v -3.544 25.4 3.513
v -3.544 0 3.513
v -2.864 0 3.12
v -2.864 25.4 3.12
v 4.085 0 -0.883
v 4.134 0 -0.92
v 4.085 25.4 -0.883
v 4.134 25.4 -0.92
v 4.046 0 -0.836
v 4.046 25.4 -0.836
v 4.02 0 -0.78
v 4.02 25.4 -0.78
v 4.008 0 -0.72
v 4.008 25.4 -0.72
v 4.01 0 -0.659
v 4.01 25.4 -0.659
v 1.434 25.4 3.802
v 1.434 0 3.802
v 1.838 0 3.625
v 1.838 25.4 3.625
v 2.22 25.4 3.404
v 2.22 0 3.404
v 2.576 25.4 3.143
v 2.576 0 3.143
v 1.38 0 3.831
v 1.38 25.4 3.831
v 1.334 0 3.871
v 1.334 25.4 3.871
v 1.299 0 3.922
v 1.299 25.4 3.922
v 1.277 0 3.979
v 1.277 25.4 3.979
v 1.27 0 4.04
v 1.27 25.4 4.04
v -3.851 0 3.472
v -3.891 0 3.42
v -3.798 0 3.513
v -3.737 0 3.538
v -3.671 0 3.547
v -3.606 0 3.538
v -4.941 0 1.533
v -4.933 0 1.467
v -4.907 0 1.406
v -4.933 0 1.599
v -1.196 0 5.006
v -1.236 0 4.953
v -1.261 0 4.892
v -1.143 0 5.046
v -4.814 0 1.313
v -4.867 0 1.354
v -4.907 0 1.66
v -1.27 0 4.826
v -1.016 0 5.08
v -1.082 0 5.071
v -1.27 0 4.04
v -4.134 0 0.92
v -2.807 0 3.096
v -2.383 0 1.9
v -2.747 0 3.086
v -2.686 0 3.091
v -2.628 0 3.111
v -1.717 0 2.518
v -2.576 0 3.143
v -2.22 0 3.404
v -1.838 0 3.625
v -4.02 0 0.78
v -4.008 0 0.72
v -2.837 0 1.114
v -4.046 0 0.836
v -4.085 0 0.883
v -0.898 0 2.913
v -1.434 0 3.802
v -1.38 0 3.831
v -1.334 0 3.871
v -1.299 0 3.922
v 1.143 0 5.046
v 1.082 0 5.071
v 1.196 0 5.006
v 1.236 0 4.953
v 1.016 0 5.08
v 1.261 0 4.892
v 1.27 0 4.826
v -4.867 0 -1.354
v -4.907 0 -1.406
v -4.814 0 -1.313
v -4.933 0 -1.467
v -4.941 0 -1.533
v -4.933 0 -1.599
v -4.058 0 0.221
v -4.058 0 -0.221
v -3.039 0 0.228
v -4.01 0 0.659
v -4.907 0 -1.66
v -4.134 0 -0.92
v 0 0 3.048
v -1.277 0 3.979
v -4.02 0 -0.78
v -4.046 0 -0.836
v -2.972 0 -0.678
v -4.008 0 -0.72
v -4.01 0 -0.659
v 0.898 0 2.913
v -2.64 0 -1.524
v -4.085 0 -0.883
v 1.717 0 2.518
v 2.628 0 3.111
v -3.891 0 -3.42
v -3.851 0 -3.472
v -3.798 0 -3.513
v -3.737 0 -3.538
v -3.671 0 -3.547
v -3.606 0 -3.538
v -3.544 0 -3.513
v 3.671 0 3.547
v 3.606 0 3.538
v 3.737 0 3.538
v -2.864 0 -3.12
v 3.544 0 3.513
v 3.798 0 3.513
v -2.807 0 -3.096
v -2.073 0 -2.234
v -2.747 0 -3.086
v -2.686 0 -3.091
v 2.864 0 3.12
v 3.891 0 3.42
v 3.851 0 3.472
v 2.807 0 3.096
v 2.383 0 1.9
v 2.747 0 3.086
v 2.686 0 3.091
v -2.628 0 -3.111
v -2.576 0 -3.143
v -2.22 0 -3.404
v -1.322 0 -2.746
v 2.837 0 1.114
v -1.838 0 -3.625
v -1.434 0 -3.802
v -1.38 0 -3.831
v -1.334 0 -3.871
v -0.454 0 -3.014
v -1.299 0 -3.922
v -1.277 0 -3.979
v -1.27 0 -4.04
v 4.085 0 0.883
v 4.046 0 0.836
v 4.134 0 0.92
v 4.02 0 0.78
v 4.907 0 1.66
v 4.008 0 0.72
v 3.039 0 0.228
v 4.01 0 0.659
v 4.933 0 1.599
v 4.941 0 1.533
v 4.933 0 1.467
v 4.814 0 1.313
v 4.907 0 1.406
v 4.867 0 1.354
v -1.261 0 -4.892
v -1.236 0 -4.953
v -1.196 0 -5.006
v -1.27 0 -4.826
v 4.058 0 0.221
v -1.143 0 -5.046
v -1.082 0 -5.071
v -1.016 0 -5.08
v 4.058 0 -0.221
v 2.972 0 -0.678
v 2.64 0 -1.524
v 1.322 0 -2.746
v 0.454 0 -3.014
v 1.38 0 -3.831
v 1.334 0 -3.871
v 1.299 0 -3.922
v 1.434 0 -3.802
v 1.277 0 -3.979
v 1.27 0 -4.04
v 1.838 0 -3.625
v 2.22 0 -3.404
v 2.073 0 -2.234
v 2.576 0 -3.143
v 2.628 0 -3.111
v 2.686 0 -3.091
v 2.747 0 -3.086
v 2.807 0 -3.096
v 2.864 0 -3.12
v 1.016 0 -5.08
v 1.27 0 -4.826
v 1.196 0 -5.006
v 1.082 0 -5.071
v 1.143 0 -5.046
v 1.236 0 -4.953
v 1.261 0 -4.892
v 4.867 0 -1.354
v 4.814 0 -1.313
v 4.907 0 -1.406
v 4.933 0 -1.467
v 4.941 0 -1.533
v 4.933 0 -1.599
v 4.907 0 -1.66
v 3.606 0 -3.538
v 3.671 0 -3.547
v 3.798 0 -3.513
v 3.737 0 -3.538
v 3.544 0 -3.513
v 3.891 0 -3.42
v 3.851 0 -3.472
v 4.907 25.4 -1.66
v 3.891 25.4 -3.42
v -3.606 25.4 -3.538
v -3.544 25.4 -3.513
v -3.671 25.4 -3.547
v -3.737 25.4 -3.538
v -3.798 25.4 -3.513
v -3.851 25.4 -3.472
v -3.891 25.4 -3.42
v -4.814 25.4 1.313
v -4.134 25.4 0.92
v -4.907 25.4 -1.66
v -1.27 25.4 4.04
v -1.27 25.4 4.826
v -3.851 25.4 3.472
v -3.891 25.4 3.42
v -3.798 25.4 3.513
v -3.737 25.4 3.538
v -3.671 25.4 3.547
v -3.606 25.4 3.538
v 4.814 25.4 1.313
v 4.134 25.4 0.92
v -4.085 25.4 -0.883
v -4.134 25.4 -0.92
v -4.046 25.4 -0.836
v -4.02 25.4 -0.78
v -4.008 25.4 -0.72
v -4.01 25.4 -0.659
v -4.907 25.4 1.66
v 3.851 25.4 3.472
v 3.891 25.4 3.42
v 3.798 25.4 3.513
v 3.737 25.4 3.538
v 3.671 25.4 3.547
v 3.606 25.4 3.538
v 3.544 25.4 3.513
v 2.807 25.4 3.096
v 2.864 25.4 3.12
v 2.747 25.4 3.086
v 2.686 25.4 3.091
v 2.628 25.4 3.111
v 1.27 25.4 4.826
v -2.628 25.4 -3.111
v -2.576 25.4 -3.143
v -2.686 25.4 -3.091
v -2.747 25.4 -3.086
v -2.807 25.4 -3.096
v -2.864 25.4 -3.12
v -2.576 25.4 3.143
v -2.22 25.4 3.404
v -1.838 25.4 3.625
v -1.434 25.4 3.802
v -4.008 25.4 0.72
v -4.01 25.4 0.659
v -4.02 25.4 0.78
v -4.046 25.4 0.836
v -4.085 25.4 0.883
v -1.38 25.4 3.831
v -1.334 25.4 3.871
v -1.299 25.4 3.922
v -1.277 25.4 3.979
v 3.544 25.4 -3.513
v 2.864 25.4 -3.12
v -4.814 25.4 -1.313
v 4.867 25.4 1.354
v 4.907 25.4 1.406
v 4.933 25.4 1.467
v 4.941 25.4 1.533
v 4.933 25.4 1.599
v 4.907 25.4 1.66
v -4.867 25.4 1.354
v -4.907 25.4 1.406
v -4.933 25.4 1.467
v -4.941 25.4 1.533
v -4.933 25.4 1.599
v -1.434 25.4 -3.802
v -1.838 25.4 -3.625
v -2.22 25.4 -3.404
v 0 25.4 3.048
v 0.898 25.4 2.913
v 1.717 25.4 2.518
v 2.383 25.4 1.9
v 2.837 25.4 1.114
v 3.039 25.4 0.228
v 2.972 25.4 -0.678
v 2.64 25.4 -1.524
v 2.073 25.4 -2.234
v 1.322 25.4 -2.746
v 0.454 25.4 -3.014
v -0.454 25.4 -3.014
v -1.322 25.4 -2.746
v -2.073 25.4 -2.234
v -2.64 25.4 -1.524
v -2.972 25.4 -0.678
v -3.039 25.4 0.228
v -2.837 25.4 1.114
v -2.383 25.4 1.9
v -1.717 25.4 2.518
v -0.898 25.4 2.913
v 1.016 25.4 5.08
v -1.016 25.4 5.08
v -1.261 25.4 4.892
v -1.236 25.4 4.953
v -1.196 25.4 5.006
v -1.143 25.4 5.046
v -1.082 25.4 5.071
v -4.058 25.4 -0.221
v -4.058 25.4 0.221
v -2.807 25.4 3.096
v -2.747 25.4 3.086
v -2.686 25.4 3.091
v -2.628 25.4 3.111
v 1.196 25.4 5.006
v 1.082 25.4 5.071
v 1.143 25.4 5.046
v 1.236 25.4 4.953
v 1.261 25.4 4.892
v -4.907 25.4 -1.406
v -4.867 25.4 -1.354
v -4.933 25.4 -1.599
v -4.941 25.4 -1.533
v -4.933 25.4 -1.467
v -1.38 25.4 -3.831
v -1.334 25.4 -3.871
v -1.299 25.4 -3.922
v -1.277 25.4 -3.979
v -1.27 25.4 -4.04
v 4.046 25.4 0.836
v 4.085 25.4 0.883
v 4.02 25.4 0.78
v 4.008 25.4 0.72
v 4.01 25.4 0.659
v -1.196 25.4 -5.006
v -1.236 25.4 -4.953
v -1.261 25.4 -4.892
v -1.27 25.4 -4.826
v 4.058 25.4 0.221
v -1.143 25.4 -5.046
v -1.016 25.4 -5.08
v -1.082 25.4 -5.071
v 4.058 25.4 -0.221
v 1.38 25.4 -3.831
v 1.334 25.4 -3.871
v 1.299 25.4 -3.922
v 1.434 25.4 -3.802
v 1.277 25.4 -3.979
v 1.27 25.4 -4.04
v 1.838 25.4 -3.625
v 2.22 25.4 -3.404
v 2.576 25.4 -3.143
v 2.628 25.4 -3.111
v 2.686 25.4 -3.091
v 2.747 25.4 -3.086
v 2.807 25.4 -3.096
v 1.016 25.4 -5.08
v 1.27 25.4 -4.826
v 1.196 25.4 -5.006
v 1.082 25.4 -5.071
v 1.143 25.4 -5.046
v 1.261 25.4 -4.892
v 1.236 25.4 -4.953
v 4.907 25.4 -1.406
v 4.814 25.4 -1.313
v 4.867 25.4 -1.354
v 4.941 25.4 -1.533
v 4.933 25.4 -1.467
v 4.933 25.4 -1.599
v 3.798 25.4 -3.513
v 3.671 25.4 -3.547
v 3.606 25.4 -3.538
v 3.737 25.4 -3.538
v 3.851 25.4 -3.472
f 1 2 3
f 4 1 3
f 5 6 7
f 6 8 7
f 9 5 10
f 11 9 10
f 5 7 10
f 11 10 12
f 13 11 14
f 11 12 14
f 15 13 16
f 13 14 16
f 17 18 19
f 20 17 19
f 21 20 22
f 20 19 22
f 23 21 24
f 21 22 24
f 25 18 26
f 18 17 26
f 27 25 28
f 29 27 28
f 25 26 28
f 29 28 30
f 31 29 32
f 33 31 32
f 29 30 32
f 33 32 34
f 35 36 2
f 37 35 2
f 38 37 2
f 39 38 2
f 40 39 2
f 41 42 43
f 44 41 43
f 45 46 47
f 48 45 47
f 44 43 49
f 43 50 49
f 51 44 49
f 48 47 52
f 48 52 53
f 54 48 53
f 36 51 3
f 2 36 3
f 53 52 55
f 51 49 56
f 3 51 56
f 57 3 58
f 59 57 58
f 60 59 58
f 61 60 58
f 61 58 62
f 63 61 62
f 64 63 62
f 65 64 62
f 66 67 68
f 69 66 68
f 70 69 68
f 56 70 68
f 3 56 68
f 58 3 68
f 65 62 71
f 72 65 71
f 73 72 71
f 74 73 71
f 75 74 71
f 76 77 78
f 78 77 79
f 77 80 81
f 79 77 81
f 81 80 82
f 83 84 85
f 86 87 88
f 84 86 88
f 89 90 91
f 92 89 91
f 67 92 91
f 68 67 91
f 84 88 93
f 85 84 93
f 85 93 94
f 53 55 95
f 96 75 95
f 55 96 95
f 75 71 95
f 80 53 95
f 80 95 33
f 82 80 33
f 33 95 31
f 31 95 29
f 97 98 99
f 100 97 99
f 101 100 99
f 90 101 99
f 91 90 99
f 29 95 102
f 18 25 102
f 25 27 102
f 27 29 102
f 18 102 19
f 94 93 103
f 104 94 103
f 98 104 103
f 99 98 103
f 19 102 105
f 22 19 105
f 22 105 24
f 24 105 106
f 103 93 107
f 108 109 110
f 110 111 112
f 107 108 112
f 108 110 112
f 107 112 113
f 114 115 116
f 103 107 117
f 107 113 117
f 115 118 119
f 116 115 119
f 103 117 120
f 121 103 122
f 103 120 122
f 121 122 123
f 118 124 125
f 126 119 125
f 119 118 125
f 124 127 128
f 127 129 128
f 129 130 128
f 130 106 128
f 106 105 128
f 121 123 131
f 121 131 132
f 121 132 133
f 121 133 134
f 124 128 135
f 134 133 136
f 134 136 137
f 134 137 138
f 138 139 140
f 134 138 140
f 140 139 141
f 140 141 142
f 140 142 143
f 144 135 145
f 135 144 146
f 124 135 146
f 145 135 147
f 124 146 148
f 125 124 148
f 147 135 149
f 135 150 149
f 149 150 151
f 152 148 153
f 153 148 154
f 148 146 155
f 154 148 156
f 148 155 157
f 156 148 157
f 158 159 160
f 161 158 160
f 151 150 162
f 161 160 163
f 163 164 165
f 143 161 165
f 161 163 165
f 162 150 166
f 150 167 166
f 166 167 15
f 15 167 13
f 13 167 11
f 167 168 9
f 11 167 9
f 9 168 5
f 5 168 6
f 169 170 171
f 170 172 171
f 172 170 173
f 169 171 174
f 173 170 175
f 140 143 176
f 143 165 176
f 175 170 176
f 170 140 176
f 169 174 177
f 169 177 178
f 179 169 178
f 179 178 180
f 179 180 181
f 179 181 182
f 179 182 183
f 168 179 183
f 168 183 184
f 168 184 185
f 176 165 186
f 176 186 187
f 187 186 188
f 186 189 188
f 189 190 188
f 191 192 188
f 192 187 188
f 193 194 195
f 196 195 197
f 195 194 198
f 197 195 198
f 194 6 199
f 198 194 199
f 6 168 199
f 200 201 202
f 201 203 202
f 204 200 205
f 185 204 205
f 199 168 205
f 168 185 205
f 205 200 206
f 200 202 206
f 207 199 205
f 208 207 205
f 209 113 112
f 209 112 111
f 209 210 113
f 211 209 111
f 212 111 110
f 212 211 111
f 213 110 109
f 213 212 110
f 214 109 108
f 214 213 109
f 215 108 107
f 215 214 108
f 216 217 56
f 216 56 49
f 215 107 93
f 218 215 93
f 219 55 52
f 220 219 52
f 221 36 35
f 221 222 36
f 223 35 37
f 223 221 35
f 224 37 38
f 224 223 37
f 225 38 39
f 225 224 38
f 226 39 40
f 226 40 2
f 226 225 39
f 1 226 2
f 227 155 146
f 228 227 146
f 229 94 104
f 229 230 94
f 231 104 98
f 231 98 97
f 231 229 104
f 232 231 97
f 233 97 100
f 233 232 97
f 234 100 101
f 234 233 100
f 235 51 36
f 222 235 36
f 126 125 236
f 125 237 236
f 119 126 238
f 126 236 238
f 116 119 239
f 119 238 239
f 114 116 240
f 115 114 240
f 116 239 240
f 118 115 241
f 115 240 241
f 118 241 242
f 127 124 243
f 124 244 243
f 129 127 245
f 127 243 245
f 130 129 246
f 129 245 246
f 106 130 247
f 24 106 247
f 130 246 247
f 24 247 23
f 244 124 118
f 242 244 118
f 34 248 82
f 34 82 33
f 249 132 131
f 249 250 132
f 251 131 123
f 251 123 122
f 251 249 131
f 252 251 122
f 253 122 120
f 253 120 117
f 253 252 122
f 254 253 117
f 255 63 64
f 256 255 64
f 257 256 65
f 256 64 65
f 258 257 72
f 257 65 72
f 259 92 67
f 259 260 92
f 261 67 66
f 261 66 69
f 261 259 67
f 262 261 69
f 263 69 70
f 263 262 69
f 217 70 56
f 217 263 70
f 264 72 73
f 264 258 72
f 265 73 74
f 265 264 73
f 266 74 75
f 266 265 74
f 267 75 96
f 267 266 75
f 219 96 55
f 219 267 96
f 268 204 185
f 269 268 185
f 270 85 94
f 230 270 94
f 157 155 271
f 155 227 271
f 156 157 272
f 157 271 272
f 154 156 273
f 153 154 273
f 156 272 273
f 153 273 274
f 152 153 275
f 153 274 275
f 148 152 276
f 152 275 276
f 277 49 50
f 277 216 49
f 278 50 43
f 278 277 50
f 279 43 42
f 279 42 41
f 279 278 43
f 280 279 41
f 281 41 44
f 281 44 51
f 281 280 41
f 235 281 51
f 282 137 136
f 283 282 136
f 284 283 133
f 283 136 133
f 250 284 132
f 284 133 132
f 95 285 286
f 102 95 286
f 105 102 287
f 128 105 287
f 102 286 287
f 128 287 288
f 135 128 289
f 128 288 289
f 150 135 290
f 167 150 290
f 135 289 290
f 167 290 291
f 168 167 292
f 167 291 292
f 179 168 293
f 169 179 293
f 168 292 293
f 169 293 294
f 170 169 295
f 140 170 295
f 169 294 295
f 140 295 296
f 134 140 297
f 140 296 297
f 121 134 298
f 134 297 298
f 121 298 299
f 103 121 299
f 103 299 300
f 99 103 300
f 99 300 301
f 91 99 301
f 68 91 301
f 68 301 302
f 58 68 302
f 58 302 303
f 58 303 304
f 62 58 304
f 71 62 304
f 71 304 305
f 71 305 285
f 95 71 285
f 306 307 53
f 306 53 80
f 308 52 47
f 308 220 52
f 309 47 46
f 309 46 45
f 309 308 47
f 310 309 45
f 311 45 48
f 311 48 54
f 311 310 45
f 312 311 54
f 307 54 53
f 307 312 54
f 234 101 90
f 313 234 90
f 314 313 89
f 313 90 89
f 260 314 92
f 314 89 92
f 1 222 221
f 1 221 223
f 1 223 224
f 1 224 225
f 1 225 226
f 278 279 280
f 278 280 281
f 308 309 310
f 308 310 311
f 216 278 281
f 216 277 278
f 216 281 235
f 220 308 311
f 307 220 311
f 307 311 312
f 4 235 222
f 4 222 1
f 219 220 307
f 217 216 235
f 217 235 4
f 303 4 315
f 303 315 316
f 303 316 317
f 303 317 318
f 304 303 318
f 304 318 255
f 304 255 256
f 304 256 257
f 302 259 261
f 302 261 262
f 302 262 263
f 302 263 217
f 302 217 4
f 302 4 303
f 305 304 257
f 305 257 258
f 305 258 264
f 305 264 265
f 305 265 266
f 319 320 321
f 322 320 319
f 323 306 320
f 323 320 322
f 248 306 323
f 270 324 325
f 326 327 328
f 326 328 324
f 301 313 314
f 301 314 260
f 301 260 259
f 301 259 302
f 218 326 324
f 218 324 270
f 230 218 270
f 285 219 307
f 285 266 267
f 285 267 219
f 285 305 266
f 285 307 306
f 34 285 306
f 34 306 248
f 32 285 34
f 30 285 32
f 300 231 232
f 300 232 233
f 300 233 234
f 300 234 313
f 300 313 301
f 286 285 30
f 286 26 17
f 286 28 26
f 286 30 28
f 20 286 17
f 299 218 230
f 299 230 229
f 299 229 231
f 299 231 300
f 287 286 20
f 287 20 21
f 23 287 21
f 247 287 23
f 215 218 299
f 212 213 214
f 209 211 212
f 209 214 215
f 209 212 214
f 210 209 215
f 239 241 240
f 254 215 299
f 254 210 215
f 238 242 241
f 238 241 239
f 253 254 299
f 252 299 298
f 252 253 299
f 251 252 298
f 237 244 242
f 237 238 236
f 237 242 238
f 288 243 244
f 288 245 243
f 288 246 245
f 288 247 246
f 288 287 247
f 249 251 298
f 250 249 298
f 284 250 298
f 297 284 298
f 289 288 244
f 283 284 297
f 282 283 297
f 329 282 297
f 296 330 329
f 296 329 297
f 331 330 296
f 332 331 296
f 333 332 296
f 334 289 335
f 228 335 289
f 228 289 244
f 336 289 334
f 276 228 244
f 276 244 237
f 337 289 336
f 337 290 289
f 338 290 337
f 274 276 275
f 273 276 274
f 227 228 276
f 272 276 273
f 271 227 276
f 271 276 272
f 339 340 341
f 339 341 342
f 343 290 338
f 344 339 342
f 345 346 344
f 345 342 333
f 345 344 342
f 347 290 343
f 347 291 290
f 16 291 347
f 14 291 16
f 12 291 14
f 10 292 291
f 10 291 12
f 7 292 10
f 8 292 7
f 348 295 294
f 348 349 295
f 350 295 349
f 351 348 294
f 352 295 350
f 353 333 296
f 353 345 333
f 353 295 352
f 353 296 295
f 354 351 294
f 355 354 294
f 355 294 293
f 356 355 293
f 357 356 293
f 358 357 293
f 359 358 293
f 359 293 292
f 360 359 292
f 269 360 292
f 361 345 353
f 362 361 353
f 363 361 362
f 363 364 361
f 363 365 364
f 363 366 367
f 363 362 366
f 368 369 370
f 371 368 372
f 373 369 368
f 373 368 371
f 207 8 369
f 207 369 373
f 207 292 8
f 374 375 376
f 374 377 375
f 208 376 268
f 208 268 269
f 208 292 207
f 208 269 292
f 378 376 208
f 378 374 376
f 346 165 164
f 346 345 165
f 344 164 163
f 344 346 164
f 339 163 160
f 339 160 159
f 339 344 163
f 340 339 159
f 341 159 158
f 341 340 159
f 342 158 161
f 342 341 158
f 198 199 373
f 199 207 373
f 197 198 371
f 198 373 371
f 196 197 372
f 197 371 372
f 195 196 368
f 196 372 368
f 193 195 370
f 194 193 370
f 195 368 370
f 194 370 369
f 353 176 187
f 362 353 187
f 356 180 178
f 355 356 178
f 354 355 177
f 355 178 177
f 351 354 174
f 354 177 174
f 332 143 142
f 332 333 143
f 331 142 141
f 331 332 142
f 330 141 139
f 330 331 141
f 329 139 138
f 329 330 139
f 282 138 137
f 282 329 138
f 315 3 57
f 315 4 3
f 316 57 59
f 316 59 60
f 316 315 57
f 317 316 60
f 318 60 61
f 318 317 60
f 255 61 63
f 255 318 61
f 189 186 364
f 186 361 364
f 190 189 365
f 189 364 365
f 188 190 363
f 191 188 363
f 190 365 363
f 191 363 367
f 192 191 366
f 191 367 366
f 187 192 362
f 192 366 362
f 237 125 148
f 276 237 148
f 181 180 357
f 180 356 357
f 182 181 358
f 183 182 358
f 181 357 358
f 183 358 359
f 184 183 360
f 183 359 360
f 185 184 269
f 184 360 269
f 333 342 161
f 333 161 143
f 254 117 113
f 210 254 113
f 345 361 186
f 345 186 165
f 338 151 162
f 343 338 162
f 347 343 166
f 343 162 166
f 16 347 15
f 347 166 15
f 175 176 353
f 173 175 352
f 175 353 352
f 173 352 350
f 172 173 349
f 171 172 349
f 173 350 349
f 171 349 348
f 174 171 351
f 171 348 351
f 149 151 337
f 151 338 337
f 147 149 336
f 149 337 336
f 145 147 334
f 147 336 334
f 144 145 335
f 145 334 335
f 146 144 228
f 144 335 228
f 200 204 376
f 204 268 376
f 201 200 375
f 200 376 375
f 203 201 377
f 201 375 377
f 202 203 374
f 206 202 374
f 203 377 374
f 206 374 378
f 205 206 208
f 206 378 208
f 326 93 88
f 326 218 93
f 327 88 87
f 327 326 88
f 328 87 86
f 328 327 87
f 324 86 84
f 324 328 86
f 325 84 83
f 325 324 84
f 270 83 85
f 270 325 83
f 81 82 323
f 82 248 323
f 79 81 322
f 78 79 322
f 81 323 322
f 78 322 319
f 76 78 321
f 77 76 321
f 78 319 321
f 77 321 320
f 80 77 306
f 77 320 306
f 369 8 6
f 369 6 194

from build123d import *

# Parameters (mm, degrees)
BOSS_EXTRUDE2_DEPTH = 25.4
SKETCH5_R           = 3.048
CUT_EXTRUDE1_DEPTH  = 27.387718251
FILLET1_R           = 0.254


with BuildPart() as part:
    # Sketch4 → Boss-Extrude2 (new body)
    with BuildSketch(Plane(origin=(0, 0, 0), x_dir=(1, 0, 0), z_dir=(0, 1, 0))):
        with BuildLine():
            Line((1.27, 5.08), (-1.27, 5.08))
            Line((-1.27, 5.08), (-1.27, 3.860465775))
            ThreePointArc((-1.27, 3.860465775), (-2.032, 3.519527241), (-2.708261432, 3.03008515))
            Line((-2.708261432, 3.03008515), (-3.764409051, 3.639852263))
            Line((-3.764409051, 3.639852263), (-5.034409051, 1.440147737))
            Line((-5.034409051, 1.440147737), (-3.978261432, 0.830380625))
            ThreePointArc((-3.978261432, 0.830380625), (-4.064, 0), (-3.978261432, -0.830380625))
            Line((-3.978261432, -0.830380625), (-5.034409051, -1.440147737))
            Line((-5.034409051, -1.440147737), (-3.764409051, -3.639852263))
            Line((-3.764409051, -3.639852263), (-2.708261432, -3.03008515))
            ThreePointArc((-2.708261432, -3.03008515), (-2.032, -3.519527241), (-1.27, -3.860465775))
            Line((-1.27, -3.860465775), (-1.27, -5.08))
            Line((-1.27, -5.08), (1.27, -5.08))
            Line((1.27, -5.08), (1.27, -3.860465775))
            ThreePointArc((1.27, -3.860465775), (2.032, -3.519527241), (2.708261432, -3.03008515))
            Line((2.708261432, -3.03008515), (3.764409051, -3.639852263))
            Line((3.764409051, -3.639852263), (5.034409051, -1.440147737))
            Line((5.034409051, -1.440147737), (3.978261432, -0.830380625))
            ThreePointArc((3.978261432, -0.830380625), (4.064, 0), (3.978261432, 0.830380625))
            Line((3.978261432, 0.830380625), (5.034409051, 1.440147737))
            Line((5.034409051, 1.440147737), (3.764409051, 3.639852263))
            Line((3.764409051, 3.639852263), (2.708261432, 3.03008515))
            ThreePointArc((2.708261432, 3.03008515), (2.032, 3.519527241), (1.27, 3.860465775))
            Line((1.27, 3.860465775), (1.27, 5.08))
        make_face()
    extrude(amount=BOSS_EXTRUDE2_DEPTH)

    # Sketch5 → Cut-Extrude1 (cut, through all)
    with BuildSketch(Plane(origin=(0, 25.4, 0), x_dir=(1, 0, 0), z_dir=(0, 1, 0))):
        Circle(SKETCH5_R)
    extrude(amount=-CUT_EXTRUDE1_DEPTH, mode=Mode.SUBTRACT)

    # Fillet1
    fillet1_edges = [part.edges().sort_by_distance(p)[0] for p in [
        (5.034409051, 12.7, -1.440147737),
        (3.978261432, 12.7, -0.830380625),
        (3.978261432, 12.7, 0.830380625),
        (5.034409051, 12.7, 1.440147737),
        (3.764409051, 12.7, 3.639852263),
        (2.708261432, 12.7, 3.03008515),
        (1.27, 12.7, 5.08),
        (1.27, 12.7, 3.860465775),
        (-1.27, 12.7, 5.08),
        (-1.27, 12.7, 3.860465775),
        (-2.708261432, 12.7, 3.03008515),
        (-3.764409051, 12.7, 3.639852263),
        (-5.034409051, 12.7, 1.440147737),
        (-3.978261432, 12.7, 0.830380625),
        (-3.978261432, 12.7, -0.830380625),
        (-5.034409051, 12.7, -1.440147737),
        (-3.764409051, 12.7, -3.639852263),
        (-1.27, 12.7, -3.860465775),
        (-2.708261432, 12.7, -3.03008515),
        (-1.27, 12.7, -5.08),
        (1.27, 12.7, -5.08),
        (1.27, 12.7, -3.860465775),
        (3.764409051, 12.7, -3.639852263),
        (2.708261432, 12.7, -3.03008515),
    ]]
    fillet(fillet1_edges, radius=FILLET1_R)


solid = part.part
